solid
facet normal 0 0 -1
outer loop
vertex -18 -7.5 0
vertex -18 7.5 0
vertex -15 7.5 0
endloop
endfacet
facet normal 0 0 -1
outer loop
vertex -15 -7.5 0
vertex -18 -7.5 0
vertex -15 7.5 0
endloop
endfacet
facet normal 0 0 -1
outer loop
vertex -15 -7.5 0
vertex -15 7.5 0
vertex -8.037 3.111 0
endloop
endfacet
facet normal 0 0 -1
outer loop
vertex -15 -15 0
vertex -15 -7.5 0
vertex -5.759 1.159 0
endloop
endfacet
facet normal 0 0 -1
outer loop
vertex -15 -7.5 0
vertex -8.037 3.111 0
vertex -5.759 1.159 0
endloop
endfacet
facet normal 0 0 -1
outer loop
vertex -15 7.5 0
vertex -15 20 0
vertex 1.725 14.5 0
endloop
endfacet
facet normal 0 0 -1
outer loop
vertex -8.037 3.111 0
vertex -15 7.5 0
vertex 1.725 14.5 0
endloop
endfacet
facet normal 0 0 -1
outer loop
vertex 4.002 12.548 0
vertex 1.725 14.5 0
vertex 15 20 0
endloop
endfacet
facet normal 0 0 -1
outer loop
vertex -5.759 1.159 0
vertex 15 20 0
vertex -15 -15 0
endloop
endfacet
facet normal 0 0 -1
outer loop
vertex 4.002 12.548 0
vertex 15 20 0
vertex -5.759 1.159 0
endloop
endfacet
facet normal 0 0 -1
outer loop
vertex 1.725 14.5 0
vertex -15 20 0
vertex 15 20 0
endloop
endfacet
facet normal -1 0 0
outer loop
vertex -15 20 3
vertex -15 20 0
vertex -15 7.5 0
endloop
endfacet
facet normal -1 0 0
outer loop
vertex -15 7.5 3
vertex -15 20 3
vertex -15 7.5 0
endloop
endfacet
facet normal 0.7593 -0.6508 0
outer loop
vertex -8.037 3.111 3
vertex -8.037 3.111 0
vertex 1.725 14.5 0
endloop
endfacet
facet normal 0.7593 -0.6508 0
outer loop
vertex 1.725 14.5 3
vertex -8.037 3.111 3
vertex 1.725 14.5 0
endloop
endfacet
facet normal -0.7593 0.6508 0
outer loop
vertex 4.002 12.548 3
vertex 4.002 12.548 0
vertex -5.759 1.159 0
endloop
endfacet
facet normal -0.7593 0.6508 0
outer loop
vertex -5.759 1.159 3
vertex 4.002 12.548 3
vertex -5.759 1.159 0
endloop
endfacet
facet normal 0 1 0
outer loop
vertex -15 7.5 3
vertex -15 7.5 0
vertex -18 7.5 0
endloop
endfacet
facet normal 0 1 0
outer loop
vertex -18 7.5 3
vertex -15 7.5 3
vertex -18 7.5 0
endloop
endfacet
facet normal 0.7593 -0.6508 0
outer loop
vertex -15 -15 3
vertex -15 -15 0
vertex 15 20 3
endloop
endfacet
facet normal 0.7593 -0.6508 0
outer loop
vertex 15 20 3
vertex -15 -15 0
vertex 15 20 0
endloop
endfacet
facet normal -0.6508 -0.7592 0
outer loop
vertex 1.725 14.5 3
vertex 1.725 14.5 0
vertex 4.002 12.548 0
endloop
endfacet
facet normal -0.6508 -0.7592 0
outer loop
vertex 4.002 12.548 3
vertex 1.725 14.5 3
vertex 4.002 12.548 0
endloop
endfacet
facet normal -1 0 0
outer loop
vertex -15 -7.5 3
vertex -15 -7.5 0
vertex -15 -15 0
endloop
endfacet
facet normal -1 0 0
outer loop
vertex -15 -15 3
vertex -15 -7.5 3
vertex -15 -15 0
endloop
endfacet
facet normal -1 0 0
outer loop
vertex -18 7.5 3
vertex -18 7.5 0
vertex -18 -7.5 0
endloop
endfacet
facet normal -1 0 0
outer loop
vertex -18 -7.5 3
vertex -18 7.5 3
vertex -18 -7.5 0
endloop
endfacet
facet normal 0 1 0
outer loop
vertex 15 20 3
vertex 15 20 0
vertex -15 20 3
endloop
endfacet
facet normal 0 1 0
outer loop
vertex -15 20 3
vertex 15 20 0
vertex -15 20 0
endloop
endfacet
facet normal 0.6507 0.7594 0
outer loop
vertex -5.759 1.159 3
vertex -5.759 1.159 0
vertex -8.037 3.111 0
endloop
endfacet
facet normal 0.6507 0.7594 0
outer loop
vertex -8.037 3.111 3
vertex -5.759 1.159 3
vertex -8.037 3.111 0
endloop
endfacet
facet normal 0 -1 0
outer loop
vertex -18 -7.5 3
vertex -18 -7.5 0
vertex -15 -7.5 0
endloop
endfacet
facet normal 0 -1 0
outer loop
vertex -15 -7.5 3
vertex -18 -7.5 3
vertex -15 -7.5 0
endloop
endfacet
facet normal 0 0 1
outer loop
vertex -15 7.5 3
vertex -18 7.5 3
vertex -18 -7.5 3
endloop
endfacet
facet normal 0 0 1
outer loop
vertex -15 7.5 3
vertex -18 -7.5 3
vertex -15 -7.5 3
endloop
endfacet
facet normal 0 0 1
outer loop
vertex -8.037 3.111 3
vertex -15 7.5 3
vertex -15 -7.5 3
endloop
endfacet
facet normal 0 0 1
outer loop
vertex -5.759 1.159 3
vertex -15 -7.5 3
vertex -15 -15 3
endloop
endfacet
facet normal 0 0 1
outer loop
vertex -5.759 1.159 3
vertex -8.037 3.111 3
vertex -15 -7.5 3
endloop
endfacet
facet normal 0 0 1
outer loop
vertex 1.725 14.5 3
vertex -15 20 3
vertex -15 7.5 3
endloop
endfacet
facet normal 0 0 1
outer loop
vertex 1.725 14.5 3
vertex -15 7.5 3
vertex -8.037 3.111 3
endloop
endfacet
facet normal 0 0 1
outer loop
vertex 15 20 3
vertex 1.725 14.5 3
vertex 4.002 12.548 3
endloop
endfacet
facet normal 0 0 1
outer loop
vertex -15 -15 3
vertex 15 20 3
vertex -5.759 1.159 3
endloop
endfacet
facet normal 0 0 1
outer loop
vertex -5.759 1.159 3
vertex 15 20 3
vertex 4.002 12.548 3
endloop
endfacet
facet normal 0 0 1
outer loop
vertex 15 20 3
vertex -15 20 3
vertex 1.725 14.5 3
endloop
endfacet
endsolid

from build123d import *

# Parameters (mm, degrees)
BOSS_EXTRUDE1_DEPTH = 3


with BuildPart() as part:
    # Sketch1 → Boss-Extrude1 (new body)
    with BuildSketch(Plane.XY):
        Polygon((-15, -15), (15, 20), (-15, 20), (-15, 7.5), (-18, 7.5), (-18, -7.5), (-15, -7.5), align=None)
        Polygon((1.724708718, 14.5), (4.002478525, 12.54762588), (-5.759392077, 1.158776844), (-8.037161884, 3.111150965), align=None, mode=Mode.SUBTRACT)
    extrude(amount=BOSS_EXTRUDE1_DEPTH)


solid = part.part
